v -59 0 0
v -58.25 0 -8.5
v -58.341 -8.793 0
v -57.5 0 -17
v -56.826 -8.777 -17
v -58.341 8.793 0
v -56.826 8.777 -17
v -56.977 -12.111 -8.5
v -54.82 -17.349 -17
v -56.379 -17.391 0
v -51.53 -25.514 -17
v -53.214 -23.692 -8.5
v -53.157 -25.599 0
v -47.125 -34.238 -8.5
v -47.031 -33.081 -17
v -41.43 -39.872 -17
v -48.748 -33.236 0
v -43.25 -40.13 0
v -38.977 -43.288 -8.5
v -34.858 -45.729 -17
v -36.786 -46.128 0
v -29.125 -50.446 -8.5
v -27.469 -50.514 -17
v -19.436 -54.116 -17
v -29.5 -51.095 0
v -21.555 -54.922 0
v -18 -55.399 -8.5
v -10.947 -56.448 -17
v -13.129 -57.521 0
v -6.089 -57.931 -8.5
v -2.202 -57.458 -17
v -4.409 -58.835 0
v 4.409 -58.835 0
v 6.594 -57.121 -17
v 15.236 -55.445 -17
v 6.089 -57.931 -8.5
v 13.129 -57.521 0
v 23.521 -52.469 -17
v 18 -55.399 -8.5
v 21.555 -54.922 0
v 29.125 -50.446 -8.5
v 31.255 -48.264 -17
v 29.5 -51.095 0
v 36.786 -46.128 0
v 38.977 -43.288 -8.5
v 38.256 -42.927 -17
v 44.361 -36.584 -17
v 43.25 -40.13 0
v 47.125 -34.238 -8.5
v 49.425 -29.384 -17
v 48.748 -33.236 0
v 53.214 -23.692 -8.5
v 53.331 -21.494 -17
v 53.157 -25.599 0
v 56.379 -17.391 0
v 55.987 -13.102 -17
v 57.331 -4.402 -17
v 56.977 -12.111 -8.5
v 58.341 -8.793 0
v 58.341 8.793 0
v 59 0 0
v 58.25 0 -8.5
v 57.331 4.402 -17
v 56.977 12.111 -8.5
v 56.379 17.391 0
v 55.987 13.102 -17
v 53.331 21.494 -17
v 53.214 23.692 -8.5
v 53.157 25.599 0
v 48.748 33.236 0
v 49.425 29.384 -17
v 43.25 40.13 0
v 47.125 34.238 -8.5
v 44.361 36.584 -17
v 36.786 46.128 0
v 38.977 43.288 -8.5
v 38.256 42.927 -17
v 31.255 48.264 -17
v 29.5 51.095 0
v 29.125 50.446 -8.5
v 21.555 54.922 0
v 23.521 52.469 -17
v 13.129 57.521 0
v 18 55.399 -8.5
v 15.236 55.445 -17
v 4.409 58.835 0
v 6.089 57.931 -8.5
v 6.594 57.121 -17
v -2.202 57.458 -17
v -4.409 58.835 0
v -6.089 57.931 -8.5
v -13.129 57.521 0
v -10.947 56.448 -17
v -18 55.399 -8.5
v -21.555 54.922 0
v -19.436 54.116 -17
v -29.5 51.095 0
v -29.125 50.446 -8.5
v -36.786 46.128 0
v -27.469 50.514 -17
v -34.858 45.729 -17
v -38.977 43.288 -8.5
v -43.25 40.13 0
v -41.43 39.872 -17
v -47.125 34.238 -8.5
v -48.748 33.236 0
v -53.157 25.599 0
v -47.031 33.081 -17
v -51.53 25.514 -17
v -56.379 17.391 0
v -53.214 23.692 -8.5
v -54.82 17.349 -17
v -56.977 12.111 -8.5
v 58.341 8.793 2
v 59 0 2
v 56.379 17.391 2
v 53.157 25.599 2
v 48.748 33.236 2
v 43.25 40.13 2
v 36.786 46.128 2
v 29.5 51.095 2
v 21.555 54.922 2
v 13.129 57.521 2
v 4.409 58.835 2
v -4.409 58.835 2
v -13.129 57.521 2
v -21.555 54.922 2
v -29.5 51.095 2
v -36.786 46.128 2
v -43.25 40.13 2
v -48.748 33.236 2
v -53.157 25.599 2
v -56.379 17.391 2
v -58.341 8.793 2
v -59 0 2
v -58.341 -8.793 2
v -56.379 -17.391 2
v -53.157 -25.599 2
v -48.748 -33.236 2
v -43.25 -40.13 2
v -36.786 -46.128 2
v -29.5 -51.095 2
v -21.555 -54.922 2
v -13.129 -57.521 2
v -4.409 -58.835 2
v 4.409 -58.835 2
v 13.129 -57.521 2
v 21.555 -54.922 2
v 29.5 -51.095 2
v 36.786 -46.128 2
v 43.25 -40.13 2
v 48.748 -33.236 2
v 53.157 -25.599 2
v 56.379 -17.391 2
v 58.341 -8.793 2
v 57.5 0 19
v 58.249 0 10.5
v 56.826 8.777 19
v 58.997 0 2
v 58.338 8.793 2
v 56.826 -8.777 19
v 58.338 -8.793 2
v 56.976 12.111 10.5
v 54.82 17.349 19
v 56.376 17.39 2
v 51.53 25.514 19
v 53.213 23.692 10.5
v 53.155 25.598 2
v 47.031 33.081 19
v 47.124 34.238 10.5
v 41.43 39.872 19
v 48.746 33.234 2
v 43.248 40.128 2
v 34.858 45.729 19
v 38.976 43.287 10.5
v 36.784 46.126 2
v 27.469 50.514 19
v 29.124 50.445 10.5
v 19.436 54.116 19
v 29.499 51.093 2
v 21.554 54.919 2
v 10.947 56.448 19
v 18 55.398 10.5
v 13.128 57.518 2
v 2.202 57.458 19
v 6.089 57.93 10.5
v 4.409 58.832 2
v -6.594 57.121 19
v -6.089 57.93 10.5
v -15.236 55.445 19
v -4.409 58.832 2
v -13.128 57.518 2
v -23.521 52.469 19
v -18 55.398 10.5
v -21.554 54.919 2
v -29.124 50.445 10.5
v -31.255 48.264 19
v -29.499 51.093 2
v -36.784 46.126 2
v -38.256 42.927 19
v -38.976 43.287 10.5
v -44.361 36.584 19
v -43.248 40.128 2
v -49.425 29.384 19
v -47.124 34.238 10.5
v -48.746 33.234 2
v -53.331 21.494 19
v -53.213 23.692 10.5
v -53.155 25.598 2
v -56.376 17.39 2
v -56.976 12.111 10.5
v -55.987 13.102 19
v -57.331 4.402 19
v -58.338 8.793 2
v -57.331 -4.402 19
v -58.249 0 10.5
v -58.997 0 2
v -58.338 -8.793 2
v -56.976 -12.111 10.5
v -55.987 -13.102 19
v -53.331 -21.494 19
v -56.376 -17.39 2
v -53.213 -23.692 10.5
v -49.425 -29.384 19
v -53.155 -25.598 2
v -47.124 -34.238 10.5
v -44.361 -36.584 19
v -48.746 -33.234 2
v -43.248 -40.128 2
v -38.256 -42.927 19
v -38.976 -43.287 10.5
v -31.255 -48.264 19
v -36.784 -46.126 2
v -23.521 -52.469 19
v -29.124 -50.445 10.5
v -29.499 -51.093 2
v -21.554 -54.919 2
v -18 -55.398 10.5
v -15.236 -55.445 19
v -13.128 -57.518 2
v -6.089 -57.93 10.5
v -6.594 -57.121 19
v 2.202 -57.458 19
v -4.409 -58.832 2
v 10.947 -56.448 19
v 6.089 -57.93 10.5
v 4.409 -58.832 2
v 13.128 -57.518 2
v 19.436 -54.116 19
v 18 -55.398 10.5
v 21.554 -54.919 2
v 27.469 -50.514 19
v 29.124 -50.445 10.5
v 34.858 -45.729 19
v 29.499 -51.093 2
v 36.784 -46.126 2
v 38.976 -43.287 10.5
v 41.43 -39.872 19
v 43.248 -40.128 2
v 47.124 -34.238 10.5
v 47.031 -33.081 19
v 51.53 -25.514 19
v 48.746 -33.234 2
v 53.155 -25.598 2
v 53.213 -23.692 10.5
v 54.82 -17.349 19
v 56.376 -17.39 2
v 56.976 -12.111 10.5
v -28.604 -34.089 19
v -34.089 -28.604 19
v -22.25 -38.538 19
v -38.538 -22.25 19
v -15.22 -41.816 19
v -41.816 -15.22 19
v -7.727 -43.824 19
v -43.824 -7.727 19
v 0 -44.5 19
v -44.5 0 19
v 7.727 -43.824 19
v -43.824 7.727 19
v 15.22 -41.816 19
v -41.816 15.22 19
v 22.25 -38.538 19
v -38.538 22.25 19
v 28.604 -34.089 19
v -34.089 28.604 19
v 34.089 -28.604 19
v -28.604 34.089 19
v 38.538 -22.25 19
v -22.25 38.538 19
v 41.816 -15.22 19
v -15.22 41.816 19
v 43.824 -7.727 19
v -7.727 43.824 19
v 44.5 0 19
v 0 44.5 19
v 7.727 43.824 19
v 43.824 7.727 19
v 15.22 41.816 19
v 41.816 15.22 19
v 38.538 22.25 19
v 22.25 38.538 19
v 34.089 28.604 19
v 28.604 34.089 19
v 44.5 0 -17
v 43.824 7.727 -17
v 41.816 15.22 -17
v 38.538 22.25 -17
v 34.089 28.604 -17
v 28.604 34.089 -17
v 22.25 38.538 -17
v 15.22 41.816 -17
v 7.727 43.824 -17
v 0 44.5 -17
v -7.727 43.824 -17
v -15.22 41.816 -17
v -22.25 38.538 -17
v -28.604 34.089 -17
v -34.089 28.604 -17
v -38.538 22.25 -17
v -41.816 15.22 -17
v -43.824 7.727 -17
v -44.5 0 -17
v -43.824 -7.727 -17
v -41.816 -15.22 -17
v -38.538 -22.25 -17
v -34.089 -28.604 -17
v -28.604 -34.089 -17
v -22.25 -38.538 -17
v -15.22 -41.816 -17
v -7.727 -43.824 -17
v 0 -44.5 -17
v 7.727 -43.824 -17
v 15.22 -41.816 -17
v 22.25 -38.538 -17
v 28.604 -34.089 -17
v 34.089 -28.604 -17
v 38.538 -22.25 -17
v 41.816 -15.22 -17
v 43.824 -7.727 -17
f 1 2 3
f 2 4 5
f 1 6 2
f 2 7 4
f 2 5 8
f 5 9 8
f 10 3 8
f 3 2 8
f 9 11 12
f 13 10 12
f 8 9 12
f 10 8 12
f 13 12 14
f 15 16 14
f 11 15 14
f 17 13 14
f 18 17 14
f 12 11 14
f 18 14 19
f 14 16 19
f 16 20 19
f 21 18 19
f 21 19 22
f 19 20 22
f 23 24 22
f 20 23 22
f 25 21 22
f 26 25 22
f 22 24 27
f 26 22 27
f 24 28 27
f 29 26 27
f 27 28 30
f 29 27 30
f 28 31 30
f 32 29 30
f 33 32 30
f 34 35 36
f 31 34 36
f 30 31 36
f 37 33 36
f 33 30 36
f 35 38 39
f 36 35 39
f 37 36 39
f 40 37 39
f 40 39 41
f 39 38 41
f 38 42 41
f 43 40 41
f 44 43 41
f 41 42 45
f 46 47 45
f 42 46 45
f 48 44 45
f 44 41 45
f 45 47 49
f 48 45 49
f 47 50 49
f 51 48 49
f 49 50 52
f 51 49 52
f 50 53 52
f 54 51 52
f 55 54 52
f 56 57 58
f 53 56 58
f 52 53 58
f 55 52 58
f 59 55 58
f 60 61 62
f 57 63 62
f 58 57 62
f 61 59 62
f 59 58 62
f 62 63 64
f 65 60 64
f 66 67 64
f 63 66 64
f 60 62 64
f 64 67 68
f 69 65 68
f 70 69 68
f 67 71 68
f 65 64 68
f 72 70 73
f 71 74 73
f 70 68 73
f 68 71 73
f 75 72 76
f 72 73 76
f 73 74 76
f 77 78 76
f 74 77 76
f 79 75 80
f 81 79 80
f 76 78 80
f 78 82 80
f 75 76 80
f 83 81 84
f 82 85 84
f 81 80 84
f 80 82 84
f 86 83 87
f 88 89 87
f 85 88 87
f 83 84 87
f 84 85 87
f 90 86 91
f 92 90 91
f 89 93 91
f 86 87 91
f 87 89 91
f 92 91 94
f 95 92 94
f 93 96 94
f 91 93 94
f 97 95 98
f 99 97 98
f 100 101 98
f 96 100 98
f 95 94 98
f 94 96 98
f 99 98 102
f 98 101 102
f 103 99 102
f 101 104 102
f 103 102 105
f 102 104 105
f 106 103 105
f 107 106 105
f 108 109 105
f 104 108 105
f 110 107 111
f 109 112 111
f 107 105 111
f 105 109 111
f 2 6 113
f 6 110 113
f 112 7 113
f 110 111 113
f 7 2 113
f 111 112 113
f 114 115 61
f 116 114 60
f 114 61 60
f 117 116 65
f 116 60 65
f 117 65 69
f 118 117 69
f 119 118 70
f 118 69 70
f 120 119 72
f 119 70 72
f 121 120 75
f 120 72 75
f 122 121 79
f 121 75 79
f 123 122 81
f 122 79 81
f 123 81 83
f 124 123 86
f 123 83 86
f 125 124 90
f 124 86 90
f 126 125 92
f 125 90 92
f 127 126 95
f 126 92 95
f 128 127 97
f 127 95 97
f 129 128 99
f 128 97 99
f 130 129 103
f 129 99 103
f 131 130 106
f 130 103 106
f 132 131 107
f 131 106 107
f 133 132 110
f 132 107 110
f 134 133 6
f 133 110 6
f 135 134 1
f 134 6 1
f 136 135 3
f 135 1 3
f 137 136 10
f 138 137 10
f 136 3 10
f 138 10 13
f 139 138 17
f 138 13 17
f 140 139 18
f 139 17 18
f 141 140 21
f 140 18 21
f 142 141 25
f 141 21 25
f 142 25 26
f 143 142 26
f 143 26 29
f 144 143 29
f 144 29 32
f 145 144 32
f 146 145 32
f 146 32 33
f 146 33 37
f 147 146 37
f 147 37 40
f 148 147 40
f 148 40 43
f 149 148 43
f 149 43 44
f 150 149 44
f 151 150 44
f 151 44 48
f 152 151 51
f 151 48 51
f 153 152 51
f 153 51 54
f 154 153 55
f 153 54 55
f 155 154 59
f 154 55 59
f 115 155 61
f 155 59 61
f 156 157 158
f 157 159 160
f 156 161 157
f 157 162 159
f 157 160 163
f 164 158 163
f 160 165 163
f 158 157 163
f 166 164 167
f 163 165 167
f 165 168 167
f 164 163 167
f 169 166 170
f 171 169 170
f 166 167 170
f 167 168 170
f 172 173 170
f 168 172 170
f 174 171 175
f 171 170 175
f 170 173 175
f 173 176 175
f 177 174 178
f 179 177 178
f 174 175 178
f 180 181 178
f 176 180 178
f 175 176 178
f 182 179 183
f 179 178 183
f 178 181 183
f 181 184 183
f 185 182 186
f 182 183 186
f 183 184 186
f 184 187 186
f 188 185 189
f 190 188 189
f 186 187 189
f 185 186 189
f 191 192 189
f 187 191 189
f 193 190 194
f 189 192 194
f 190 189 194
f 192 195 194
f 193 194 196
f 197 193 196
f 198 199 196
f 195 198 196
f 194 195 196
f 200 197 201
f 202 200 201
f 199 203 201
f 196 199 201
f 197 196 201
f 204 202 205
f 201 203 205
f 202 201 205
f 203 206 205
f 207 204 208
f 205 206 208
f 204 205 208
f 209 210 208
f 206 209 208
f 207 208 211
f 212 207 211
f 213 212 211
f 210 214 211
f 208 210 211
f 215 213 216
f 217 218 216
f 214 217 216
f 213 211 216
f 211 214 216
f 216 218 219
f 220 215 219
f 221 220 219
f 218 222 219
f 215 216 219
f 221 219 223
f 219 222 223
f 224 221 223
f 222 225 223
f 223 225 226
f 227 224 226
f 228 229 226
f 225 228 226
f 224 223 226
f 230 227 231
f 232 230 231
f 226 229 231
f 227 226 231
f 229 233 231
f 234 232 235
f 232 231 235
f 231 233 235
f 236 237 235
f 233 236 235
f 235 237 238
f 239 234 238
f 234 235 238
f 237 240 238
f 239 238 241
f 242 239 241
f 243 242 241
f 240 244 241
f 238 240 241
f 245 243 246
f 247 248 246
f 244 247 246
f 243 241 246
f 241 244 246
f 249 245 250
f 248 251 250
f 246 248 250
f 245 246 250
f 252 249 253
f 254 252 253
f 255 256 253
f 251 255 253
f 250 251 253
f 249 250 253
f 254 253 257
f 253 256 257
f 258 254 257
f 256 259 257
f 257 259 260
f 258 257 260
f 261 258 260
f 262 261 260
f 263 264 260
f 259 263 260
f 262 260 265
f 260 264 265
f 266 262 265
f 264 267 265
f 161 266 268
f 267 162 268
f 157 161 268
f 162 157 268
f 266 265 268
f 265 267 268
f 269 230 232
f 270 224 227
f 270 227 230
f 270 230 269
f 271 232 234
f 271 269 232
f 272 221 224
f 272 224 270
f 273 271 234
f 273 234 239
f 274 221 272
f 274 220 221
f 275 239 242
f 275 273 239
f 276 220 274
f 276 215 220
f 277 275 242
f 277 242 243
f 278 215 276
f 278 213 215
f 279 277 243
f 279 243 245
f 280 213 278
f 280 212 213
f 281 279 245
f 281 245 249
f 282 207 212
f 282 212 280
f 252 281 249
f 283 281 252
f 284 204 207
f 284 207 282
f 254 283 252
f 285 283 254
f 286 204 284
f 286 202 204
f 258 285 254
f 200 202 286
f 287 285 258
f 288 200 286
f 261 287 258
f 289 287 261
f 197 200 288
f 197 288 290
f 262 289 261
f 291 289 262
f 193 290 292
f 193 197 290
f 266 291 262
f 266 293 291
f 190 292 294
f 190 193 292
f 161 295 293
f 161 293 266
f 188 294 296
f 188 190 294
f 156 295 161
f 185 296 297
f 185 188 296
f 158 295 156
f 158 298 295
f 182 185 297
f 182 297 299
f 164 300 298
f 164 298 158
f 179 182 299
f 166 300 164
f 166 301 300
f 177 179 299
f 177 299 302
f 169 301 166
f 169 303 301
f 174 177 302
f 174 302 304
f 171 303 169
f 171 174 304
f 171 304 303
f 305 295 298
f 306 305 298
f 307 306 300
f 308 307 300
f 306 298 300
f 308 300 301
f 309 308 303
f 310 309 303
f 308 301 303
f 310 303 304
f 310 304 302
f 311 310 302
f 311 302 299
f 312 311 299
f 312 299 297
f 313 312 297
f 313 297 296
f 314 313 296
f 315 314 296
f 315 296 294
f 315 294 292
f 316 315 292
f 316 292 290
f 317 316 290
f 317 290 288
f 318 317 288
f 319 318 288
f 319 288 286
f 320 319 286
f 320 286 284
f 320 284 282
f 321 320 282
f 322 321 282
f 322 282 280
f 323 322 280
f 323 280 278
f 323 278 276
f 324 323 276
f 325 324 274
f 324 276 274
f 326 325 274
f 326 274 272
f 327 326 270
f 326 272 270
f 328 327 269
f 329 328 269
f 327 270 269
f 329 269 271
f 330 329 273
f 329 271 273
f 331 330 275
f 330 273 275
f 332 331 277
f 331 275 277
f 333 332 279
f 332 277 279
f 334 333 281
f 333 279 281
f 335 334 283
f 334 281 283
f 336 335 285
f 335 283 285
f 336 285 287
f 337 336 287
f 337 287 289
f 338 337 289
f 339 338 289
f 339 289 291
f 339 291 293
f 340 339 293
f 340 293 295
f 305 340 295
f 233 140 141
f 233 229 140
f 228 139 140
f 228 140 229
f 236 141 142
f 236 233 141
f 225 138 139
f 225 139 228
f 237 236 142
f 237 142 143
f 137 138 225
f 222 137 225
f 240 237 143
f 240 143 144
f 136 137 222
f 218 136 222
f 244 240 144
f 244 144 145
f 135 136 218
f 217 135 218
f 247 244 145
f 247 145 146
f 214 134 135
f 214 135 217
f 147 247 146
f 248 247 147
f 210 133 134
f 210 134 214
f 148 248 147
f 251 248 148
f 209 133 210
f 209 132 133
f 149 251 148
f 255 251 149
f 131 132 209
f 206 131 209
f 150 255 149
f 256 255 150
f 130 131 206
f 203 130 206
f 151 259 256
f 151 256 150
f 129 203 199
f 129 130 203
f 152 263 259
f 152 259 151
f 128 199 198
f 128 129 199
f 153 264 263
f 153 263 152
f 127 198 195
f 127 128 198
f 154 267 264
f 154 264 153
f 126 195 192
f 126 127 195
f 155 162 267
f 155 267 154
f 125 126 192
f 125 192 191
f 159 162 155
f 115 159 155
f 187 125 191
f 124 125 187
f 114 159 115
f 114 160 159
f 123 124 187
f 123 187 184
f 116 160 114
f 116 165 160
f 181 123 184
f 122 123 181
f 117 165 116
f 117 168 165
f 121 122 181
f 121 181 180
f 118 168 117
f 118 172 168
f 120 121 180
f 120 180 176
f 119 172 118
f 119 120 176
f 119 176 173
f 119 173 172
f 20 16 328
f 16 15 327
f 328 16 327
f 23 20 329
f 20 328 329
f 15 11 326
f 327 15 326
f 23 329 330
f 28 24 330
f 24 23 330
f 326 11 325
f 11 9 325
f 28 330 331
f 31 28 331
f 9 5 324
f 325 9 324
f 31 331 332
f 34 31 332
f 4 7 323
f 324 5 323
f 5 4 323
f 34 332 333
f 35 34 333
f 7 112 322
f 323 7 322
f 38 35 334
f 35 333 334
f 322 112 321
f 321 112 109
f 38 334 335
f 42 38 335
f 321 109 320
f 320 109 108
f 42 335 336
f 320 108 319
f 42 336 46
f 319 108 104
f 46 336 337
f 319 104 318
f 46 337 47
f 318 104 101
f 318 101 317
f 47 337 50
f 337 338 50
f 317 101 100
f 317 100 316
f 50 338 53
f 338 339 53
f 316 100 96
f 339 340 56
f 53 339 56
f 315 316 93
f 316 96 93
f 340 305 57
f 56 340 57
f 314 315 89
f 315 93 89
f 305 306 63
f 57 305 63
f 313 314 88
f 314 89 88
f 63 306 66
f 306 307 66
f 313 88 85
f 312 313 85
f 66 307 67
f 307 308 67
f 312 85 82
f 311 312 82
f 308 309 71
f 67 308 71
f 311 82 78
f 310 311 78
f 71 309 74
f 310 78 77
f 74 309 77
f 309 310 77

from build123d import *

# Parameters (mm, degrees)
SKETCH11_R          = 57.5
SKETCH11_R_2        = 44.5
BOSS_EXTRUDE3_DEPTH = 17
BOSS_EXTRUDE4_START = 1
SKETCH12_R          = 59
SKETCH12_R_2        = 44.5
BOSS_EXTRUDE4_DEPTH = 1
BOSS_EXTRUDE5_START = 17
SKETCH15_R          = 57.5
SKETCH15_R_2        = 44.5
BOSS_EXTRUDE5_DEPTH = 17


with BuildPart() as part:
    # Sketch10 → Revolve1 (revolve)
    with BuildSketch(Plane(origin=(0, 0, 0), x_dir=(1, 0, 0), z_dir=(0, 1, 0)), mode=Mode.PRIVATE) as revolve1_sk:
        Polygon((57.5, 17), (57.5, 0), (59, 0), align=None)
    revolve(revolve1_sk.sketch.rotate(Axis((0, 0, -66.869527167), (0, 0, 1)), 180), axis=Axis((0, 0, -66.869527167), (0, 0, 1)))

    # Sketch11 → Boss-Extrude3 (add)
    with BuildSketch(Plane.XY):
        Circle(SKETCH11_R)
        Circle(SKETCH11_R_2, mode=Mode.SUBTRACT)
    extrude(amount=-BOSS_EXTRUDE3_DEPTH)

    # Sketch12 → Boss-Extrude4 (add)
    with BuildSketch(Plane.XY.offset(BOSS_EXTRUDE4_START)):
        Circle(SKETCH12_R)
        Circle(SKETCH12_R_2, mode=Mode.SUBTRACT)
    boss_extrude4 = extrude(amount=-BOSS_EXTRUDE4_DEPTH)

    # Mirror11: Boss-Extrude4 across plane
    add(boss_extrude4.mirror(Plane.XY.offset(1)))

    # Sketch14 → Revolve2 (revolve)
    with BuildSketch(Plane(origin=(0, 0, 0), x_dir=(1, 0, 0), z_dir=(0, 1, 0)), mode=Mode.PRIVATE) as revolve2_sk:
        Polygon((-57.5, -2), (-57.5, -19), (-59, -1.968953878), align=None)
    revolve(revolve2_sk.sketch.rotate(Axis((0, 0, -34.208114596), (0, 0, 1)), 180), axis=Axis((0, 0, -34.208114596), (0, 0, 1)))

    # Sketch15 → Boss-Extrude5 (add)
    with BuildSketch(Plane.XY.offset(2).offset(BOSS_EXTRUDE5_START)):
        Circle(SKETCH15_R)
        Circle(SKETCH15_R_2, mode=Mode.SUBTRACT)
    extrude(amount=-BOSS_EXTRUDE5_DEPTH)


solid = part.part
